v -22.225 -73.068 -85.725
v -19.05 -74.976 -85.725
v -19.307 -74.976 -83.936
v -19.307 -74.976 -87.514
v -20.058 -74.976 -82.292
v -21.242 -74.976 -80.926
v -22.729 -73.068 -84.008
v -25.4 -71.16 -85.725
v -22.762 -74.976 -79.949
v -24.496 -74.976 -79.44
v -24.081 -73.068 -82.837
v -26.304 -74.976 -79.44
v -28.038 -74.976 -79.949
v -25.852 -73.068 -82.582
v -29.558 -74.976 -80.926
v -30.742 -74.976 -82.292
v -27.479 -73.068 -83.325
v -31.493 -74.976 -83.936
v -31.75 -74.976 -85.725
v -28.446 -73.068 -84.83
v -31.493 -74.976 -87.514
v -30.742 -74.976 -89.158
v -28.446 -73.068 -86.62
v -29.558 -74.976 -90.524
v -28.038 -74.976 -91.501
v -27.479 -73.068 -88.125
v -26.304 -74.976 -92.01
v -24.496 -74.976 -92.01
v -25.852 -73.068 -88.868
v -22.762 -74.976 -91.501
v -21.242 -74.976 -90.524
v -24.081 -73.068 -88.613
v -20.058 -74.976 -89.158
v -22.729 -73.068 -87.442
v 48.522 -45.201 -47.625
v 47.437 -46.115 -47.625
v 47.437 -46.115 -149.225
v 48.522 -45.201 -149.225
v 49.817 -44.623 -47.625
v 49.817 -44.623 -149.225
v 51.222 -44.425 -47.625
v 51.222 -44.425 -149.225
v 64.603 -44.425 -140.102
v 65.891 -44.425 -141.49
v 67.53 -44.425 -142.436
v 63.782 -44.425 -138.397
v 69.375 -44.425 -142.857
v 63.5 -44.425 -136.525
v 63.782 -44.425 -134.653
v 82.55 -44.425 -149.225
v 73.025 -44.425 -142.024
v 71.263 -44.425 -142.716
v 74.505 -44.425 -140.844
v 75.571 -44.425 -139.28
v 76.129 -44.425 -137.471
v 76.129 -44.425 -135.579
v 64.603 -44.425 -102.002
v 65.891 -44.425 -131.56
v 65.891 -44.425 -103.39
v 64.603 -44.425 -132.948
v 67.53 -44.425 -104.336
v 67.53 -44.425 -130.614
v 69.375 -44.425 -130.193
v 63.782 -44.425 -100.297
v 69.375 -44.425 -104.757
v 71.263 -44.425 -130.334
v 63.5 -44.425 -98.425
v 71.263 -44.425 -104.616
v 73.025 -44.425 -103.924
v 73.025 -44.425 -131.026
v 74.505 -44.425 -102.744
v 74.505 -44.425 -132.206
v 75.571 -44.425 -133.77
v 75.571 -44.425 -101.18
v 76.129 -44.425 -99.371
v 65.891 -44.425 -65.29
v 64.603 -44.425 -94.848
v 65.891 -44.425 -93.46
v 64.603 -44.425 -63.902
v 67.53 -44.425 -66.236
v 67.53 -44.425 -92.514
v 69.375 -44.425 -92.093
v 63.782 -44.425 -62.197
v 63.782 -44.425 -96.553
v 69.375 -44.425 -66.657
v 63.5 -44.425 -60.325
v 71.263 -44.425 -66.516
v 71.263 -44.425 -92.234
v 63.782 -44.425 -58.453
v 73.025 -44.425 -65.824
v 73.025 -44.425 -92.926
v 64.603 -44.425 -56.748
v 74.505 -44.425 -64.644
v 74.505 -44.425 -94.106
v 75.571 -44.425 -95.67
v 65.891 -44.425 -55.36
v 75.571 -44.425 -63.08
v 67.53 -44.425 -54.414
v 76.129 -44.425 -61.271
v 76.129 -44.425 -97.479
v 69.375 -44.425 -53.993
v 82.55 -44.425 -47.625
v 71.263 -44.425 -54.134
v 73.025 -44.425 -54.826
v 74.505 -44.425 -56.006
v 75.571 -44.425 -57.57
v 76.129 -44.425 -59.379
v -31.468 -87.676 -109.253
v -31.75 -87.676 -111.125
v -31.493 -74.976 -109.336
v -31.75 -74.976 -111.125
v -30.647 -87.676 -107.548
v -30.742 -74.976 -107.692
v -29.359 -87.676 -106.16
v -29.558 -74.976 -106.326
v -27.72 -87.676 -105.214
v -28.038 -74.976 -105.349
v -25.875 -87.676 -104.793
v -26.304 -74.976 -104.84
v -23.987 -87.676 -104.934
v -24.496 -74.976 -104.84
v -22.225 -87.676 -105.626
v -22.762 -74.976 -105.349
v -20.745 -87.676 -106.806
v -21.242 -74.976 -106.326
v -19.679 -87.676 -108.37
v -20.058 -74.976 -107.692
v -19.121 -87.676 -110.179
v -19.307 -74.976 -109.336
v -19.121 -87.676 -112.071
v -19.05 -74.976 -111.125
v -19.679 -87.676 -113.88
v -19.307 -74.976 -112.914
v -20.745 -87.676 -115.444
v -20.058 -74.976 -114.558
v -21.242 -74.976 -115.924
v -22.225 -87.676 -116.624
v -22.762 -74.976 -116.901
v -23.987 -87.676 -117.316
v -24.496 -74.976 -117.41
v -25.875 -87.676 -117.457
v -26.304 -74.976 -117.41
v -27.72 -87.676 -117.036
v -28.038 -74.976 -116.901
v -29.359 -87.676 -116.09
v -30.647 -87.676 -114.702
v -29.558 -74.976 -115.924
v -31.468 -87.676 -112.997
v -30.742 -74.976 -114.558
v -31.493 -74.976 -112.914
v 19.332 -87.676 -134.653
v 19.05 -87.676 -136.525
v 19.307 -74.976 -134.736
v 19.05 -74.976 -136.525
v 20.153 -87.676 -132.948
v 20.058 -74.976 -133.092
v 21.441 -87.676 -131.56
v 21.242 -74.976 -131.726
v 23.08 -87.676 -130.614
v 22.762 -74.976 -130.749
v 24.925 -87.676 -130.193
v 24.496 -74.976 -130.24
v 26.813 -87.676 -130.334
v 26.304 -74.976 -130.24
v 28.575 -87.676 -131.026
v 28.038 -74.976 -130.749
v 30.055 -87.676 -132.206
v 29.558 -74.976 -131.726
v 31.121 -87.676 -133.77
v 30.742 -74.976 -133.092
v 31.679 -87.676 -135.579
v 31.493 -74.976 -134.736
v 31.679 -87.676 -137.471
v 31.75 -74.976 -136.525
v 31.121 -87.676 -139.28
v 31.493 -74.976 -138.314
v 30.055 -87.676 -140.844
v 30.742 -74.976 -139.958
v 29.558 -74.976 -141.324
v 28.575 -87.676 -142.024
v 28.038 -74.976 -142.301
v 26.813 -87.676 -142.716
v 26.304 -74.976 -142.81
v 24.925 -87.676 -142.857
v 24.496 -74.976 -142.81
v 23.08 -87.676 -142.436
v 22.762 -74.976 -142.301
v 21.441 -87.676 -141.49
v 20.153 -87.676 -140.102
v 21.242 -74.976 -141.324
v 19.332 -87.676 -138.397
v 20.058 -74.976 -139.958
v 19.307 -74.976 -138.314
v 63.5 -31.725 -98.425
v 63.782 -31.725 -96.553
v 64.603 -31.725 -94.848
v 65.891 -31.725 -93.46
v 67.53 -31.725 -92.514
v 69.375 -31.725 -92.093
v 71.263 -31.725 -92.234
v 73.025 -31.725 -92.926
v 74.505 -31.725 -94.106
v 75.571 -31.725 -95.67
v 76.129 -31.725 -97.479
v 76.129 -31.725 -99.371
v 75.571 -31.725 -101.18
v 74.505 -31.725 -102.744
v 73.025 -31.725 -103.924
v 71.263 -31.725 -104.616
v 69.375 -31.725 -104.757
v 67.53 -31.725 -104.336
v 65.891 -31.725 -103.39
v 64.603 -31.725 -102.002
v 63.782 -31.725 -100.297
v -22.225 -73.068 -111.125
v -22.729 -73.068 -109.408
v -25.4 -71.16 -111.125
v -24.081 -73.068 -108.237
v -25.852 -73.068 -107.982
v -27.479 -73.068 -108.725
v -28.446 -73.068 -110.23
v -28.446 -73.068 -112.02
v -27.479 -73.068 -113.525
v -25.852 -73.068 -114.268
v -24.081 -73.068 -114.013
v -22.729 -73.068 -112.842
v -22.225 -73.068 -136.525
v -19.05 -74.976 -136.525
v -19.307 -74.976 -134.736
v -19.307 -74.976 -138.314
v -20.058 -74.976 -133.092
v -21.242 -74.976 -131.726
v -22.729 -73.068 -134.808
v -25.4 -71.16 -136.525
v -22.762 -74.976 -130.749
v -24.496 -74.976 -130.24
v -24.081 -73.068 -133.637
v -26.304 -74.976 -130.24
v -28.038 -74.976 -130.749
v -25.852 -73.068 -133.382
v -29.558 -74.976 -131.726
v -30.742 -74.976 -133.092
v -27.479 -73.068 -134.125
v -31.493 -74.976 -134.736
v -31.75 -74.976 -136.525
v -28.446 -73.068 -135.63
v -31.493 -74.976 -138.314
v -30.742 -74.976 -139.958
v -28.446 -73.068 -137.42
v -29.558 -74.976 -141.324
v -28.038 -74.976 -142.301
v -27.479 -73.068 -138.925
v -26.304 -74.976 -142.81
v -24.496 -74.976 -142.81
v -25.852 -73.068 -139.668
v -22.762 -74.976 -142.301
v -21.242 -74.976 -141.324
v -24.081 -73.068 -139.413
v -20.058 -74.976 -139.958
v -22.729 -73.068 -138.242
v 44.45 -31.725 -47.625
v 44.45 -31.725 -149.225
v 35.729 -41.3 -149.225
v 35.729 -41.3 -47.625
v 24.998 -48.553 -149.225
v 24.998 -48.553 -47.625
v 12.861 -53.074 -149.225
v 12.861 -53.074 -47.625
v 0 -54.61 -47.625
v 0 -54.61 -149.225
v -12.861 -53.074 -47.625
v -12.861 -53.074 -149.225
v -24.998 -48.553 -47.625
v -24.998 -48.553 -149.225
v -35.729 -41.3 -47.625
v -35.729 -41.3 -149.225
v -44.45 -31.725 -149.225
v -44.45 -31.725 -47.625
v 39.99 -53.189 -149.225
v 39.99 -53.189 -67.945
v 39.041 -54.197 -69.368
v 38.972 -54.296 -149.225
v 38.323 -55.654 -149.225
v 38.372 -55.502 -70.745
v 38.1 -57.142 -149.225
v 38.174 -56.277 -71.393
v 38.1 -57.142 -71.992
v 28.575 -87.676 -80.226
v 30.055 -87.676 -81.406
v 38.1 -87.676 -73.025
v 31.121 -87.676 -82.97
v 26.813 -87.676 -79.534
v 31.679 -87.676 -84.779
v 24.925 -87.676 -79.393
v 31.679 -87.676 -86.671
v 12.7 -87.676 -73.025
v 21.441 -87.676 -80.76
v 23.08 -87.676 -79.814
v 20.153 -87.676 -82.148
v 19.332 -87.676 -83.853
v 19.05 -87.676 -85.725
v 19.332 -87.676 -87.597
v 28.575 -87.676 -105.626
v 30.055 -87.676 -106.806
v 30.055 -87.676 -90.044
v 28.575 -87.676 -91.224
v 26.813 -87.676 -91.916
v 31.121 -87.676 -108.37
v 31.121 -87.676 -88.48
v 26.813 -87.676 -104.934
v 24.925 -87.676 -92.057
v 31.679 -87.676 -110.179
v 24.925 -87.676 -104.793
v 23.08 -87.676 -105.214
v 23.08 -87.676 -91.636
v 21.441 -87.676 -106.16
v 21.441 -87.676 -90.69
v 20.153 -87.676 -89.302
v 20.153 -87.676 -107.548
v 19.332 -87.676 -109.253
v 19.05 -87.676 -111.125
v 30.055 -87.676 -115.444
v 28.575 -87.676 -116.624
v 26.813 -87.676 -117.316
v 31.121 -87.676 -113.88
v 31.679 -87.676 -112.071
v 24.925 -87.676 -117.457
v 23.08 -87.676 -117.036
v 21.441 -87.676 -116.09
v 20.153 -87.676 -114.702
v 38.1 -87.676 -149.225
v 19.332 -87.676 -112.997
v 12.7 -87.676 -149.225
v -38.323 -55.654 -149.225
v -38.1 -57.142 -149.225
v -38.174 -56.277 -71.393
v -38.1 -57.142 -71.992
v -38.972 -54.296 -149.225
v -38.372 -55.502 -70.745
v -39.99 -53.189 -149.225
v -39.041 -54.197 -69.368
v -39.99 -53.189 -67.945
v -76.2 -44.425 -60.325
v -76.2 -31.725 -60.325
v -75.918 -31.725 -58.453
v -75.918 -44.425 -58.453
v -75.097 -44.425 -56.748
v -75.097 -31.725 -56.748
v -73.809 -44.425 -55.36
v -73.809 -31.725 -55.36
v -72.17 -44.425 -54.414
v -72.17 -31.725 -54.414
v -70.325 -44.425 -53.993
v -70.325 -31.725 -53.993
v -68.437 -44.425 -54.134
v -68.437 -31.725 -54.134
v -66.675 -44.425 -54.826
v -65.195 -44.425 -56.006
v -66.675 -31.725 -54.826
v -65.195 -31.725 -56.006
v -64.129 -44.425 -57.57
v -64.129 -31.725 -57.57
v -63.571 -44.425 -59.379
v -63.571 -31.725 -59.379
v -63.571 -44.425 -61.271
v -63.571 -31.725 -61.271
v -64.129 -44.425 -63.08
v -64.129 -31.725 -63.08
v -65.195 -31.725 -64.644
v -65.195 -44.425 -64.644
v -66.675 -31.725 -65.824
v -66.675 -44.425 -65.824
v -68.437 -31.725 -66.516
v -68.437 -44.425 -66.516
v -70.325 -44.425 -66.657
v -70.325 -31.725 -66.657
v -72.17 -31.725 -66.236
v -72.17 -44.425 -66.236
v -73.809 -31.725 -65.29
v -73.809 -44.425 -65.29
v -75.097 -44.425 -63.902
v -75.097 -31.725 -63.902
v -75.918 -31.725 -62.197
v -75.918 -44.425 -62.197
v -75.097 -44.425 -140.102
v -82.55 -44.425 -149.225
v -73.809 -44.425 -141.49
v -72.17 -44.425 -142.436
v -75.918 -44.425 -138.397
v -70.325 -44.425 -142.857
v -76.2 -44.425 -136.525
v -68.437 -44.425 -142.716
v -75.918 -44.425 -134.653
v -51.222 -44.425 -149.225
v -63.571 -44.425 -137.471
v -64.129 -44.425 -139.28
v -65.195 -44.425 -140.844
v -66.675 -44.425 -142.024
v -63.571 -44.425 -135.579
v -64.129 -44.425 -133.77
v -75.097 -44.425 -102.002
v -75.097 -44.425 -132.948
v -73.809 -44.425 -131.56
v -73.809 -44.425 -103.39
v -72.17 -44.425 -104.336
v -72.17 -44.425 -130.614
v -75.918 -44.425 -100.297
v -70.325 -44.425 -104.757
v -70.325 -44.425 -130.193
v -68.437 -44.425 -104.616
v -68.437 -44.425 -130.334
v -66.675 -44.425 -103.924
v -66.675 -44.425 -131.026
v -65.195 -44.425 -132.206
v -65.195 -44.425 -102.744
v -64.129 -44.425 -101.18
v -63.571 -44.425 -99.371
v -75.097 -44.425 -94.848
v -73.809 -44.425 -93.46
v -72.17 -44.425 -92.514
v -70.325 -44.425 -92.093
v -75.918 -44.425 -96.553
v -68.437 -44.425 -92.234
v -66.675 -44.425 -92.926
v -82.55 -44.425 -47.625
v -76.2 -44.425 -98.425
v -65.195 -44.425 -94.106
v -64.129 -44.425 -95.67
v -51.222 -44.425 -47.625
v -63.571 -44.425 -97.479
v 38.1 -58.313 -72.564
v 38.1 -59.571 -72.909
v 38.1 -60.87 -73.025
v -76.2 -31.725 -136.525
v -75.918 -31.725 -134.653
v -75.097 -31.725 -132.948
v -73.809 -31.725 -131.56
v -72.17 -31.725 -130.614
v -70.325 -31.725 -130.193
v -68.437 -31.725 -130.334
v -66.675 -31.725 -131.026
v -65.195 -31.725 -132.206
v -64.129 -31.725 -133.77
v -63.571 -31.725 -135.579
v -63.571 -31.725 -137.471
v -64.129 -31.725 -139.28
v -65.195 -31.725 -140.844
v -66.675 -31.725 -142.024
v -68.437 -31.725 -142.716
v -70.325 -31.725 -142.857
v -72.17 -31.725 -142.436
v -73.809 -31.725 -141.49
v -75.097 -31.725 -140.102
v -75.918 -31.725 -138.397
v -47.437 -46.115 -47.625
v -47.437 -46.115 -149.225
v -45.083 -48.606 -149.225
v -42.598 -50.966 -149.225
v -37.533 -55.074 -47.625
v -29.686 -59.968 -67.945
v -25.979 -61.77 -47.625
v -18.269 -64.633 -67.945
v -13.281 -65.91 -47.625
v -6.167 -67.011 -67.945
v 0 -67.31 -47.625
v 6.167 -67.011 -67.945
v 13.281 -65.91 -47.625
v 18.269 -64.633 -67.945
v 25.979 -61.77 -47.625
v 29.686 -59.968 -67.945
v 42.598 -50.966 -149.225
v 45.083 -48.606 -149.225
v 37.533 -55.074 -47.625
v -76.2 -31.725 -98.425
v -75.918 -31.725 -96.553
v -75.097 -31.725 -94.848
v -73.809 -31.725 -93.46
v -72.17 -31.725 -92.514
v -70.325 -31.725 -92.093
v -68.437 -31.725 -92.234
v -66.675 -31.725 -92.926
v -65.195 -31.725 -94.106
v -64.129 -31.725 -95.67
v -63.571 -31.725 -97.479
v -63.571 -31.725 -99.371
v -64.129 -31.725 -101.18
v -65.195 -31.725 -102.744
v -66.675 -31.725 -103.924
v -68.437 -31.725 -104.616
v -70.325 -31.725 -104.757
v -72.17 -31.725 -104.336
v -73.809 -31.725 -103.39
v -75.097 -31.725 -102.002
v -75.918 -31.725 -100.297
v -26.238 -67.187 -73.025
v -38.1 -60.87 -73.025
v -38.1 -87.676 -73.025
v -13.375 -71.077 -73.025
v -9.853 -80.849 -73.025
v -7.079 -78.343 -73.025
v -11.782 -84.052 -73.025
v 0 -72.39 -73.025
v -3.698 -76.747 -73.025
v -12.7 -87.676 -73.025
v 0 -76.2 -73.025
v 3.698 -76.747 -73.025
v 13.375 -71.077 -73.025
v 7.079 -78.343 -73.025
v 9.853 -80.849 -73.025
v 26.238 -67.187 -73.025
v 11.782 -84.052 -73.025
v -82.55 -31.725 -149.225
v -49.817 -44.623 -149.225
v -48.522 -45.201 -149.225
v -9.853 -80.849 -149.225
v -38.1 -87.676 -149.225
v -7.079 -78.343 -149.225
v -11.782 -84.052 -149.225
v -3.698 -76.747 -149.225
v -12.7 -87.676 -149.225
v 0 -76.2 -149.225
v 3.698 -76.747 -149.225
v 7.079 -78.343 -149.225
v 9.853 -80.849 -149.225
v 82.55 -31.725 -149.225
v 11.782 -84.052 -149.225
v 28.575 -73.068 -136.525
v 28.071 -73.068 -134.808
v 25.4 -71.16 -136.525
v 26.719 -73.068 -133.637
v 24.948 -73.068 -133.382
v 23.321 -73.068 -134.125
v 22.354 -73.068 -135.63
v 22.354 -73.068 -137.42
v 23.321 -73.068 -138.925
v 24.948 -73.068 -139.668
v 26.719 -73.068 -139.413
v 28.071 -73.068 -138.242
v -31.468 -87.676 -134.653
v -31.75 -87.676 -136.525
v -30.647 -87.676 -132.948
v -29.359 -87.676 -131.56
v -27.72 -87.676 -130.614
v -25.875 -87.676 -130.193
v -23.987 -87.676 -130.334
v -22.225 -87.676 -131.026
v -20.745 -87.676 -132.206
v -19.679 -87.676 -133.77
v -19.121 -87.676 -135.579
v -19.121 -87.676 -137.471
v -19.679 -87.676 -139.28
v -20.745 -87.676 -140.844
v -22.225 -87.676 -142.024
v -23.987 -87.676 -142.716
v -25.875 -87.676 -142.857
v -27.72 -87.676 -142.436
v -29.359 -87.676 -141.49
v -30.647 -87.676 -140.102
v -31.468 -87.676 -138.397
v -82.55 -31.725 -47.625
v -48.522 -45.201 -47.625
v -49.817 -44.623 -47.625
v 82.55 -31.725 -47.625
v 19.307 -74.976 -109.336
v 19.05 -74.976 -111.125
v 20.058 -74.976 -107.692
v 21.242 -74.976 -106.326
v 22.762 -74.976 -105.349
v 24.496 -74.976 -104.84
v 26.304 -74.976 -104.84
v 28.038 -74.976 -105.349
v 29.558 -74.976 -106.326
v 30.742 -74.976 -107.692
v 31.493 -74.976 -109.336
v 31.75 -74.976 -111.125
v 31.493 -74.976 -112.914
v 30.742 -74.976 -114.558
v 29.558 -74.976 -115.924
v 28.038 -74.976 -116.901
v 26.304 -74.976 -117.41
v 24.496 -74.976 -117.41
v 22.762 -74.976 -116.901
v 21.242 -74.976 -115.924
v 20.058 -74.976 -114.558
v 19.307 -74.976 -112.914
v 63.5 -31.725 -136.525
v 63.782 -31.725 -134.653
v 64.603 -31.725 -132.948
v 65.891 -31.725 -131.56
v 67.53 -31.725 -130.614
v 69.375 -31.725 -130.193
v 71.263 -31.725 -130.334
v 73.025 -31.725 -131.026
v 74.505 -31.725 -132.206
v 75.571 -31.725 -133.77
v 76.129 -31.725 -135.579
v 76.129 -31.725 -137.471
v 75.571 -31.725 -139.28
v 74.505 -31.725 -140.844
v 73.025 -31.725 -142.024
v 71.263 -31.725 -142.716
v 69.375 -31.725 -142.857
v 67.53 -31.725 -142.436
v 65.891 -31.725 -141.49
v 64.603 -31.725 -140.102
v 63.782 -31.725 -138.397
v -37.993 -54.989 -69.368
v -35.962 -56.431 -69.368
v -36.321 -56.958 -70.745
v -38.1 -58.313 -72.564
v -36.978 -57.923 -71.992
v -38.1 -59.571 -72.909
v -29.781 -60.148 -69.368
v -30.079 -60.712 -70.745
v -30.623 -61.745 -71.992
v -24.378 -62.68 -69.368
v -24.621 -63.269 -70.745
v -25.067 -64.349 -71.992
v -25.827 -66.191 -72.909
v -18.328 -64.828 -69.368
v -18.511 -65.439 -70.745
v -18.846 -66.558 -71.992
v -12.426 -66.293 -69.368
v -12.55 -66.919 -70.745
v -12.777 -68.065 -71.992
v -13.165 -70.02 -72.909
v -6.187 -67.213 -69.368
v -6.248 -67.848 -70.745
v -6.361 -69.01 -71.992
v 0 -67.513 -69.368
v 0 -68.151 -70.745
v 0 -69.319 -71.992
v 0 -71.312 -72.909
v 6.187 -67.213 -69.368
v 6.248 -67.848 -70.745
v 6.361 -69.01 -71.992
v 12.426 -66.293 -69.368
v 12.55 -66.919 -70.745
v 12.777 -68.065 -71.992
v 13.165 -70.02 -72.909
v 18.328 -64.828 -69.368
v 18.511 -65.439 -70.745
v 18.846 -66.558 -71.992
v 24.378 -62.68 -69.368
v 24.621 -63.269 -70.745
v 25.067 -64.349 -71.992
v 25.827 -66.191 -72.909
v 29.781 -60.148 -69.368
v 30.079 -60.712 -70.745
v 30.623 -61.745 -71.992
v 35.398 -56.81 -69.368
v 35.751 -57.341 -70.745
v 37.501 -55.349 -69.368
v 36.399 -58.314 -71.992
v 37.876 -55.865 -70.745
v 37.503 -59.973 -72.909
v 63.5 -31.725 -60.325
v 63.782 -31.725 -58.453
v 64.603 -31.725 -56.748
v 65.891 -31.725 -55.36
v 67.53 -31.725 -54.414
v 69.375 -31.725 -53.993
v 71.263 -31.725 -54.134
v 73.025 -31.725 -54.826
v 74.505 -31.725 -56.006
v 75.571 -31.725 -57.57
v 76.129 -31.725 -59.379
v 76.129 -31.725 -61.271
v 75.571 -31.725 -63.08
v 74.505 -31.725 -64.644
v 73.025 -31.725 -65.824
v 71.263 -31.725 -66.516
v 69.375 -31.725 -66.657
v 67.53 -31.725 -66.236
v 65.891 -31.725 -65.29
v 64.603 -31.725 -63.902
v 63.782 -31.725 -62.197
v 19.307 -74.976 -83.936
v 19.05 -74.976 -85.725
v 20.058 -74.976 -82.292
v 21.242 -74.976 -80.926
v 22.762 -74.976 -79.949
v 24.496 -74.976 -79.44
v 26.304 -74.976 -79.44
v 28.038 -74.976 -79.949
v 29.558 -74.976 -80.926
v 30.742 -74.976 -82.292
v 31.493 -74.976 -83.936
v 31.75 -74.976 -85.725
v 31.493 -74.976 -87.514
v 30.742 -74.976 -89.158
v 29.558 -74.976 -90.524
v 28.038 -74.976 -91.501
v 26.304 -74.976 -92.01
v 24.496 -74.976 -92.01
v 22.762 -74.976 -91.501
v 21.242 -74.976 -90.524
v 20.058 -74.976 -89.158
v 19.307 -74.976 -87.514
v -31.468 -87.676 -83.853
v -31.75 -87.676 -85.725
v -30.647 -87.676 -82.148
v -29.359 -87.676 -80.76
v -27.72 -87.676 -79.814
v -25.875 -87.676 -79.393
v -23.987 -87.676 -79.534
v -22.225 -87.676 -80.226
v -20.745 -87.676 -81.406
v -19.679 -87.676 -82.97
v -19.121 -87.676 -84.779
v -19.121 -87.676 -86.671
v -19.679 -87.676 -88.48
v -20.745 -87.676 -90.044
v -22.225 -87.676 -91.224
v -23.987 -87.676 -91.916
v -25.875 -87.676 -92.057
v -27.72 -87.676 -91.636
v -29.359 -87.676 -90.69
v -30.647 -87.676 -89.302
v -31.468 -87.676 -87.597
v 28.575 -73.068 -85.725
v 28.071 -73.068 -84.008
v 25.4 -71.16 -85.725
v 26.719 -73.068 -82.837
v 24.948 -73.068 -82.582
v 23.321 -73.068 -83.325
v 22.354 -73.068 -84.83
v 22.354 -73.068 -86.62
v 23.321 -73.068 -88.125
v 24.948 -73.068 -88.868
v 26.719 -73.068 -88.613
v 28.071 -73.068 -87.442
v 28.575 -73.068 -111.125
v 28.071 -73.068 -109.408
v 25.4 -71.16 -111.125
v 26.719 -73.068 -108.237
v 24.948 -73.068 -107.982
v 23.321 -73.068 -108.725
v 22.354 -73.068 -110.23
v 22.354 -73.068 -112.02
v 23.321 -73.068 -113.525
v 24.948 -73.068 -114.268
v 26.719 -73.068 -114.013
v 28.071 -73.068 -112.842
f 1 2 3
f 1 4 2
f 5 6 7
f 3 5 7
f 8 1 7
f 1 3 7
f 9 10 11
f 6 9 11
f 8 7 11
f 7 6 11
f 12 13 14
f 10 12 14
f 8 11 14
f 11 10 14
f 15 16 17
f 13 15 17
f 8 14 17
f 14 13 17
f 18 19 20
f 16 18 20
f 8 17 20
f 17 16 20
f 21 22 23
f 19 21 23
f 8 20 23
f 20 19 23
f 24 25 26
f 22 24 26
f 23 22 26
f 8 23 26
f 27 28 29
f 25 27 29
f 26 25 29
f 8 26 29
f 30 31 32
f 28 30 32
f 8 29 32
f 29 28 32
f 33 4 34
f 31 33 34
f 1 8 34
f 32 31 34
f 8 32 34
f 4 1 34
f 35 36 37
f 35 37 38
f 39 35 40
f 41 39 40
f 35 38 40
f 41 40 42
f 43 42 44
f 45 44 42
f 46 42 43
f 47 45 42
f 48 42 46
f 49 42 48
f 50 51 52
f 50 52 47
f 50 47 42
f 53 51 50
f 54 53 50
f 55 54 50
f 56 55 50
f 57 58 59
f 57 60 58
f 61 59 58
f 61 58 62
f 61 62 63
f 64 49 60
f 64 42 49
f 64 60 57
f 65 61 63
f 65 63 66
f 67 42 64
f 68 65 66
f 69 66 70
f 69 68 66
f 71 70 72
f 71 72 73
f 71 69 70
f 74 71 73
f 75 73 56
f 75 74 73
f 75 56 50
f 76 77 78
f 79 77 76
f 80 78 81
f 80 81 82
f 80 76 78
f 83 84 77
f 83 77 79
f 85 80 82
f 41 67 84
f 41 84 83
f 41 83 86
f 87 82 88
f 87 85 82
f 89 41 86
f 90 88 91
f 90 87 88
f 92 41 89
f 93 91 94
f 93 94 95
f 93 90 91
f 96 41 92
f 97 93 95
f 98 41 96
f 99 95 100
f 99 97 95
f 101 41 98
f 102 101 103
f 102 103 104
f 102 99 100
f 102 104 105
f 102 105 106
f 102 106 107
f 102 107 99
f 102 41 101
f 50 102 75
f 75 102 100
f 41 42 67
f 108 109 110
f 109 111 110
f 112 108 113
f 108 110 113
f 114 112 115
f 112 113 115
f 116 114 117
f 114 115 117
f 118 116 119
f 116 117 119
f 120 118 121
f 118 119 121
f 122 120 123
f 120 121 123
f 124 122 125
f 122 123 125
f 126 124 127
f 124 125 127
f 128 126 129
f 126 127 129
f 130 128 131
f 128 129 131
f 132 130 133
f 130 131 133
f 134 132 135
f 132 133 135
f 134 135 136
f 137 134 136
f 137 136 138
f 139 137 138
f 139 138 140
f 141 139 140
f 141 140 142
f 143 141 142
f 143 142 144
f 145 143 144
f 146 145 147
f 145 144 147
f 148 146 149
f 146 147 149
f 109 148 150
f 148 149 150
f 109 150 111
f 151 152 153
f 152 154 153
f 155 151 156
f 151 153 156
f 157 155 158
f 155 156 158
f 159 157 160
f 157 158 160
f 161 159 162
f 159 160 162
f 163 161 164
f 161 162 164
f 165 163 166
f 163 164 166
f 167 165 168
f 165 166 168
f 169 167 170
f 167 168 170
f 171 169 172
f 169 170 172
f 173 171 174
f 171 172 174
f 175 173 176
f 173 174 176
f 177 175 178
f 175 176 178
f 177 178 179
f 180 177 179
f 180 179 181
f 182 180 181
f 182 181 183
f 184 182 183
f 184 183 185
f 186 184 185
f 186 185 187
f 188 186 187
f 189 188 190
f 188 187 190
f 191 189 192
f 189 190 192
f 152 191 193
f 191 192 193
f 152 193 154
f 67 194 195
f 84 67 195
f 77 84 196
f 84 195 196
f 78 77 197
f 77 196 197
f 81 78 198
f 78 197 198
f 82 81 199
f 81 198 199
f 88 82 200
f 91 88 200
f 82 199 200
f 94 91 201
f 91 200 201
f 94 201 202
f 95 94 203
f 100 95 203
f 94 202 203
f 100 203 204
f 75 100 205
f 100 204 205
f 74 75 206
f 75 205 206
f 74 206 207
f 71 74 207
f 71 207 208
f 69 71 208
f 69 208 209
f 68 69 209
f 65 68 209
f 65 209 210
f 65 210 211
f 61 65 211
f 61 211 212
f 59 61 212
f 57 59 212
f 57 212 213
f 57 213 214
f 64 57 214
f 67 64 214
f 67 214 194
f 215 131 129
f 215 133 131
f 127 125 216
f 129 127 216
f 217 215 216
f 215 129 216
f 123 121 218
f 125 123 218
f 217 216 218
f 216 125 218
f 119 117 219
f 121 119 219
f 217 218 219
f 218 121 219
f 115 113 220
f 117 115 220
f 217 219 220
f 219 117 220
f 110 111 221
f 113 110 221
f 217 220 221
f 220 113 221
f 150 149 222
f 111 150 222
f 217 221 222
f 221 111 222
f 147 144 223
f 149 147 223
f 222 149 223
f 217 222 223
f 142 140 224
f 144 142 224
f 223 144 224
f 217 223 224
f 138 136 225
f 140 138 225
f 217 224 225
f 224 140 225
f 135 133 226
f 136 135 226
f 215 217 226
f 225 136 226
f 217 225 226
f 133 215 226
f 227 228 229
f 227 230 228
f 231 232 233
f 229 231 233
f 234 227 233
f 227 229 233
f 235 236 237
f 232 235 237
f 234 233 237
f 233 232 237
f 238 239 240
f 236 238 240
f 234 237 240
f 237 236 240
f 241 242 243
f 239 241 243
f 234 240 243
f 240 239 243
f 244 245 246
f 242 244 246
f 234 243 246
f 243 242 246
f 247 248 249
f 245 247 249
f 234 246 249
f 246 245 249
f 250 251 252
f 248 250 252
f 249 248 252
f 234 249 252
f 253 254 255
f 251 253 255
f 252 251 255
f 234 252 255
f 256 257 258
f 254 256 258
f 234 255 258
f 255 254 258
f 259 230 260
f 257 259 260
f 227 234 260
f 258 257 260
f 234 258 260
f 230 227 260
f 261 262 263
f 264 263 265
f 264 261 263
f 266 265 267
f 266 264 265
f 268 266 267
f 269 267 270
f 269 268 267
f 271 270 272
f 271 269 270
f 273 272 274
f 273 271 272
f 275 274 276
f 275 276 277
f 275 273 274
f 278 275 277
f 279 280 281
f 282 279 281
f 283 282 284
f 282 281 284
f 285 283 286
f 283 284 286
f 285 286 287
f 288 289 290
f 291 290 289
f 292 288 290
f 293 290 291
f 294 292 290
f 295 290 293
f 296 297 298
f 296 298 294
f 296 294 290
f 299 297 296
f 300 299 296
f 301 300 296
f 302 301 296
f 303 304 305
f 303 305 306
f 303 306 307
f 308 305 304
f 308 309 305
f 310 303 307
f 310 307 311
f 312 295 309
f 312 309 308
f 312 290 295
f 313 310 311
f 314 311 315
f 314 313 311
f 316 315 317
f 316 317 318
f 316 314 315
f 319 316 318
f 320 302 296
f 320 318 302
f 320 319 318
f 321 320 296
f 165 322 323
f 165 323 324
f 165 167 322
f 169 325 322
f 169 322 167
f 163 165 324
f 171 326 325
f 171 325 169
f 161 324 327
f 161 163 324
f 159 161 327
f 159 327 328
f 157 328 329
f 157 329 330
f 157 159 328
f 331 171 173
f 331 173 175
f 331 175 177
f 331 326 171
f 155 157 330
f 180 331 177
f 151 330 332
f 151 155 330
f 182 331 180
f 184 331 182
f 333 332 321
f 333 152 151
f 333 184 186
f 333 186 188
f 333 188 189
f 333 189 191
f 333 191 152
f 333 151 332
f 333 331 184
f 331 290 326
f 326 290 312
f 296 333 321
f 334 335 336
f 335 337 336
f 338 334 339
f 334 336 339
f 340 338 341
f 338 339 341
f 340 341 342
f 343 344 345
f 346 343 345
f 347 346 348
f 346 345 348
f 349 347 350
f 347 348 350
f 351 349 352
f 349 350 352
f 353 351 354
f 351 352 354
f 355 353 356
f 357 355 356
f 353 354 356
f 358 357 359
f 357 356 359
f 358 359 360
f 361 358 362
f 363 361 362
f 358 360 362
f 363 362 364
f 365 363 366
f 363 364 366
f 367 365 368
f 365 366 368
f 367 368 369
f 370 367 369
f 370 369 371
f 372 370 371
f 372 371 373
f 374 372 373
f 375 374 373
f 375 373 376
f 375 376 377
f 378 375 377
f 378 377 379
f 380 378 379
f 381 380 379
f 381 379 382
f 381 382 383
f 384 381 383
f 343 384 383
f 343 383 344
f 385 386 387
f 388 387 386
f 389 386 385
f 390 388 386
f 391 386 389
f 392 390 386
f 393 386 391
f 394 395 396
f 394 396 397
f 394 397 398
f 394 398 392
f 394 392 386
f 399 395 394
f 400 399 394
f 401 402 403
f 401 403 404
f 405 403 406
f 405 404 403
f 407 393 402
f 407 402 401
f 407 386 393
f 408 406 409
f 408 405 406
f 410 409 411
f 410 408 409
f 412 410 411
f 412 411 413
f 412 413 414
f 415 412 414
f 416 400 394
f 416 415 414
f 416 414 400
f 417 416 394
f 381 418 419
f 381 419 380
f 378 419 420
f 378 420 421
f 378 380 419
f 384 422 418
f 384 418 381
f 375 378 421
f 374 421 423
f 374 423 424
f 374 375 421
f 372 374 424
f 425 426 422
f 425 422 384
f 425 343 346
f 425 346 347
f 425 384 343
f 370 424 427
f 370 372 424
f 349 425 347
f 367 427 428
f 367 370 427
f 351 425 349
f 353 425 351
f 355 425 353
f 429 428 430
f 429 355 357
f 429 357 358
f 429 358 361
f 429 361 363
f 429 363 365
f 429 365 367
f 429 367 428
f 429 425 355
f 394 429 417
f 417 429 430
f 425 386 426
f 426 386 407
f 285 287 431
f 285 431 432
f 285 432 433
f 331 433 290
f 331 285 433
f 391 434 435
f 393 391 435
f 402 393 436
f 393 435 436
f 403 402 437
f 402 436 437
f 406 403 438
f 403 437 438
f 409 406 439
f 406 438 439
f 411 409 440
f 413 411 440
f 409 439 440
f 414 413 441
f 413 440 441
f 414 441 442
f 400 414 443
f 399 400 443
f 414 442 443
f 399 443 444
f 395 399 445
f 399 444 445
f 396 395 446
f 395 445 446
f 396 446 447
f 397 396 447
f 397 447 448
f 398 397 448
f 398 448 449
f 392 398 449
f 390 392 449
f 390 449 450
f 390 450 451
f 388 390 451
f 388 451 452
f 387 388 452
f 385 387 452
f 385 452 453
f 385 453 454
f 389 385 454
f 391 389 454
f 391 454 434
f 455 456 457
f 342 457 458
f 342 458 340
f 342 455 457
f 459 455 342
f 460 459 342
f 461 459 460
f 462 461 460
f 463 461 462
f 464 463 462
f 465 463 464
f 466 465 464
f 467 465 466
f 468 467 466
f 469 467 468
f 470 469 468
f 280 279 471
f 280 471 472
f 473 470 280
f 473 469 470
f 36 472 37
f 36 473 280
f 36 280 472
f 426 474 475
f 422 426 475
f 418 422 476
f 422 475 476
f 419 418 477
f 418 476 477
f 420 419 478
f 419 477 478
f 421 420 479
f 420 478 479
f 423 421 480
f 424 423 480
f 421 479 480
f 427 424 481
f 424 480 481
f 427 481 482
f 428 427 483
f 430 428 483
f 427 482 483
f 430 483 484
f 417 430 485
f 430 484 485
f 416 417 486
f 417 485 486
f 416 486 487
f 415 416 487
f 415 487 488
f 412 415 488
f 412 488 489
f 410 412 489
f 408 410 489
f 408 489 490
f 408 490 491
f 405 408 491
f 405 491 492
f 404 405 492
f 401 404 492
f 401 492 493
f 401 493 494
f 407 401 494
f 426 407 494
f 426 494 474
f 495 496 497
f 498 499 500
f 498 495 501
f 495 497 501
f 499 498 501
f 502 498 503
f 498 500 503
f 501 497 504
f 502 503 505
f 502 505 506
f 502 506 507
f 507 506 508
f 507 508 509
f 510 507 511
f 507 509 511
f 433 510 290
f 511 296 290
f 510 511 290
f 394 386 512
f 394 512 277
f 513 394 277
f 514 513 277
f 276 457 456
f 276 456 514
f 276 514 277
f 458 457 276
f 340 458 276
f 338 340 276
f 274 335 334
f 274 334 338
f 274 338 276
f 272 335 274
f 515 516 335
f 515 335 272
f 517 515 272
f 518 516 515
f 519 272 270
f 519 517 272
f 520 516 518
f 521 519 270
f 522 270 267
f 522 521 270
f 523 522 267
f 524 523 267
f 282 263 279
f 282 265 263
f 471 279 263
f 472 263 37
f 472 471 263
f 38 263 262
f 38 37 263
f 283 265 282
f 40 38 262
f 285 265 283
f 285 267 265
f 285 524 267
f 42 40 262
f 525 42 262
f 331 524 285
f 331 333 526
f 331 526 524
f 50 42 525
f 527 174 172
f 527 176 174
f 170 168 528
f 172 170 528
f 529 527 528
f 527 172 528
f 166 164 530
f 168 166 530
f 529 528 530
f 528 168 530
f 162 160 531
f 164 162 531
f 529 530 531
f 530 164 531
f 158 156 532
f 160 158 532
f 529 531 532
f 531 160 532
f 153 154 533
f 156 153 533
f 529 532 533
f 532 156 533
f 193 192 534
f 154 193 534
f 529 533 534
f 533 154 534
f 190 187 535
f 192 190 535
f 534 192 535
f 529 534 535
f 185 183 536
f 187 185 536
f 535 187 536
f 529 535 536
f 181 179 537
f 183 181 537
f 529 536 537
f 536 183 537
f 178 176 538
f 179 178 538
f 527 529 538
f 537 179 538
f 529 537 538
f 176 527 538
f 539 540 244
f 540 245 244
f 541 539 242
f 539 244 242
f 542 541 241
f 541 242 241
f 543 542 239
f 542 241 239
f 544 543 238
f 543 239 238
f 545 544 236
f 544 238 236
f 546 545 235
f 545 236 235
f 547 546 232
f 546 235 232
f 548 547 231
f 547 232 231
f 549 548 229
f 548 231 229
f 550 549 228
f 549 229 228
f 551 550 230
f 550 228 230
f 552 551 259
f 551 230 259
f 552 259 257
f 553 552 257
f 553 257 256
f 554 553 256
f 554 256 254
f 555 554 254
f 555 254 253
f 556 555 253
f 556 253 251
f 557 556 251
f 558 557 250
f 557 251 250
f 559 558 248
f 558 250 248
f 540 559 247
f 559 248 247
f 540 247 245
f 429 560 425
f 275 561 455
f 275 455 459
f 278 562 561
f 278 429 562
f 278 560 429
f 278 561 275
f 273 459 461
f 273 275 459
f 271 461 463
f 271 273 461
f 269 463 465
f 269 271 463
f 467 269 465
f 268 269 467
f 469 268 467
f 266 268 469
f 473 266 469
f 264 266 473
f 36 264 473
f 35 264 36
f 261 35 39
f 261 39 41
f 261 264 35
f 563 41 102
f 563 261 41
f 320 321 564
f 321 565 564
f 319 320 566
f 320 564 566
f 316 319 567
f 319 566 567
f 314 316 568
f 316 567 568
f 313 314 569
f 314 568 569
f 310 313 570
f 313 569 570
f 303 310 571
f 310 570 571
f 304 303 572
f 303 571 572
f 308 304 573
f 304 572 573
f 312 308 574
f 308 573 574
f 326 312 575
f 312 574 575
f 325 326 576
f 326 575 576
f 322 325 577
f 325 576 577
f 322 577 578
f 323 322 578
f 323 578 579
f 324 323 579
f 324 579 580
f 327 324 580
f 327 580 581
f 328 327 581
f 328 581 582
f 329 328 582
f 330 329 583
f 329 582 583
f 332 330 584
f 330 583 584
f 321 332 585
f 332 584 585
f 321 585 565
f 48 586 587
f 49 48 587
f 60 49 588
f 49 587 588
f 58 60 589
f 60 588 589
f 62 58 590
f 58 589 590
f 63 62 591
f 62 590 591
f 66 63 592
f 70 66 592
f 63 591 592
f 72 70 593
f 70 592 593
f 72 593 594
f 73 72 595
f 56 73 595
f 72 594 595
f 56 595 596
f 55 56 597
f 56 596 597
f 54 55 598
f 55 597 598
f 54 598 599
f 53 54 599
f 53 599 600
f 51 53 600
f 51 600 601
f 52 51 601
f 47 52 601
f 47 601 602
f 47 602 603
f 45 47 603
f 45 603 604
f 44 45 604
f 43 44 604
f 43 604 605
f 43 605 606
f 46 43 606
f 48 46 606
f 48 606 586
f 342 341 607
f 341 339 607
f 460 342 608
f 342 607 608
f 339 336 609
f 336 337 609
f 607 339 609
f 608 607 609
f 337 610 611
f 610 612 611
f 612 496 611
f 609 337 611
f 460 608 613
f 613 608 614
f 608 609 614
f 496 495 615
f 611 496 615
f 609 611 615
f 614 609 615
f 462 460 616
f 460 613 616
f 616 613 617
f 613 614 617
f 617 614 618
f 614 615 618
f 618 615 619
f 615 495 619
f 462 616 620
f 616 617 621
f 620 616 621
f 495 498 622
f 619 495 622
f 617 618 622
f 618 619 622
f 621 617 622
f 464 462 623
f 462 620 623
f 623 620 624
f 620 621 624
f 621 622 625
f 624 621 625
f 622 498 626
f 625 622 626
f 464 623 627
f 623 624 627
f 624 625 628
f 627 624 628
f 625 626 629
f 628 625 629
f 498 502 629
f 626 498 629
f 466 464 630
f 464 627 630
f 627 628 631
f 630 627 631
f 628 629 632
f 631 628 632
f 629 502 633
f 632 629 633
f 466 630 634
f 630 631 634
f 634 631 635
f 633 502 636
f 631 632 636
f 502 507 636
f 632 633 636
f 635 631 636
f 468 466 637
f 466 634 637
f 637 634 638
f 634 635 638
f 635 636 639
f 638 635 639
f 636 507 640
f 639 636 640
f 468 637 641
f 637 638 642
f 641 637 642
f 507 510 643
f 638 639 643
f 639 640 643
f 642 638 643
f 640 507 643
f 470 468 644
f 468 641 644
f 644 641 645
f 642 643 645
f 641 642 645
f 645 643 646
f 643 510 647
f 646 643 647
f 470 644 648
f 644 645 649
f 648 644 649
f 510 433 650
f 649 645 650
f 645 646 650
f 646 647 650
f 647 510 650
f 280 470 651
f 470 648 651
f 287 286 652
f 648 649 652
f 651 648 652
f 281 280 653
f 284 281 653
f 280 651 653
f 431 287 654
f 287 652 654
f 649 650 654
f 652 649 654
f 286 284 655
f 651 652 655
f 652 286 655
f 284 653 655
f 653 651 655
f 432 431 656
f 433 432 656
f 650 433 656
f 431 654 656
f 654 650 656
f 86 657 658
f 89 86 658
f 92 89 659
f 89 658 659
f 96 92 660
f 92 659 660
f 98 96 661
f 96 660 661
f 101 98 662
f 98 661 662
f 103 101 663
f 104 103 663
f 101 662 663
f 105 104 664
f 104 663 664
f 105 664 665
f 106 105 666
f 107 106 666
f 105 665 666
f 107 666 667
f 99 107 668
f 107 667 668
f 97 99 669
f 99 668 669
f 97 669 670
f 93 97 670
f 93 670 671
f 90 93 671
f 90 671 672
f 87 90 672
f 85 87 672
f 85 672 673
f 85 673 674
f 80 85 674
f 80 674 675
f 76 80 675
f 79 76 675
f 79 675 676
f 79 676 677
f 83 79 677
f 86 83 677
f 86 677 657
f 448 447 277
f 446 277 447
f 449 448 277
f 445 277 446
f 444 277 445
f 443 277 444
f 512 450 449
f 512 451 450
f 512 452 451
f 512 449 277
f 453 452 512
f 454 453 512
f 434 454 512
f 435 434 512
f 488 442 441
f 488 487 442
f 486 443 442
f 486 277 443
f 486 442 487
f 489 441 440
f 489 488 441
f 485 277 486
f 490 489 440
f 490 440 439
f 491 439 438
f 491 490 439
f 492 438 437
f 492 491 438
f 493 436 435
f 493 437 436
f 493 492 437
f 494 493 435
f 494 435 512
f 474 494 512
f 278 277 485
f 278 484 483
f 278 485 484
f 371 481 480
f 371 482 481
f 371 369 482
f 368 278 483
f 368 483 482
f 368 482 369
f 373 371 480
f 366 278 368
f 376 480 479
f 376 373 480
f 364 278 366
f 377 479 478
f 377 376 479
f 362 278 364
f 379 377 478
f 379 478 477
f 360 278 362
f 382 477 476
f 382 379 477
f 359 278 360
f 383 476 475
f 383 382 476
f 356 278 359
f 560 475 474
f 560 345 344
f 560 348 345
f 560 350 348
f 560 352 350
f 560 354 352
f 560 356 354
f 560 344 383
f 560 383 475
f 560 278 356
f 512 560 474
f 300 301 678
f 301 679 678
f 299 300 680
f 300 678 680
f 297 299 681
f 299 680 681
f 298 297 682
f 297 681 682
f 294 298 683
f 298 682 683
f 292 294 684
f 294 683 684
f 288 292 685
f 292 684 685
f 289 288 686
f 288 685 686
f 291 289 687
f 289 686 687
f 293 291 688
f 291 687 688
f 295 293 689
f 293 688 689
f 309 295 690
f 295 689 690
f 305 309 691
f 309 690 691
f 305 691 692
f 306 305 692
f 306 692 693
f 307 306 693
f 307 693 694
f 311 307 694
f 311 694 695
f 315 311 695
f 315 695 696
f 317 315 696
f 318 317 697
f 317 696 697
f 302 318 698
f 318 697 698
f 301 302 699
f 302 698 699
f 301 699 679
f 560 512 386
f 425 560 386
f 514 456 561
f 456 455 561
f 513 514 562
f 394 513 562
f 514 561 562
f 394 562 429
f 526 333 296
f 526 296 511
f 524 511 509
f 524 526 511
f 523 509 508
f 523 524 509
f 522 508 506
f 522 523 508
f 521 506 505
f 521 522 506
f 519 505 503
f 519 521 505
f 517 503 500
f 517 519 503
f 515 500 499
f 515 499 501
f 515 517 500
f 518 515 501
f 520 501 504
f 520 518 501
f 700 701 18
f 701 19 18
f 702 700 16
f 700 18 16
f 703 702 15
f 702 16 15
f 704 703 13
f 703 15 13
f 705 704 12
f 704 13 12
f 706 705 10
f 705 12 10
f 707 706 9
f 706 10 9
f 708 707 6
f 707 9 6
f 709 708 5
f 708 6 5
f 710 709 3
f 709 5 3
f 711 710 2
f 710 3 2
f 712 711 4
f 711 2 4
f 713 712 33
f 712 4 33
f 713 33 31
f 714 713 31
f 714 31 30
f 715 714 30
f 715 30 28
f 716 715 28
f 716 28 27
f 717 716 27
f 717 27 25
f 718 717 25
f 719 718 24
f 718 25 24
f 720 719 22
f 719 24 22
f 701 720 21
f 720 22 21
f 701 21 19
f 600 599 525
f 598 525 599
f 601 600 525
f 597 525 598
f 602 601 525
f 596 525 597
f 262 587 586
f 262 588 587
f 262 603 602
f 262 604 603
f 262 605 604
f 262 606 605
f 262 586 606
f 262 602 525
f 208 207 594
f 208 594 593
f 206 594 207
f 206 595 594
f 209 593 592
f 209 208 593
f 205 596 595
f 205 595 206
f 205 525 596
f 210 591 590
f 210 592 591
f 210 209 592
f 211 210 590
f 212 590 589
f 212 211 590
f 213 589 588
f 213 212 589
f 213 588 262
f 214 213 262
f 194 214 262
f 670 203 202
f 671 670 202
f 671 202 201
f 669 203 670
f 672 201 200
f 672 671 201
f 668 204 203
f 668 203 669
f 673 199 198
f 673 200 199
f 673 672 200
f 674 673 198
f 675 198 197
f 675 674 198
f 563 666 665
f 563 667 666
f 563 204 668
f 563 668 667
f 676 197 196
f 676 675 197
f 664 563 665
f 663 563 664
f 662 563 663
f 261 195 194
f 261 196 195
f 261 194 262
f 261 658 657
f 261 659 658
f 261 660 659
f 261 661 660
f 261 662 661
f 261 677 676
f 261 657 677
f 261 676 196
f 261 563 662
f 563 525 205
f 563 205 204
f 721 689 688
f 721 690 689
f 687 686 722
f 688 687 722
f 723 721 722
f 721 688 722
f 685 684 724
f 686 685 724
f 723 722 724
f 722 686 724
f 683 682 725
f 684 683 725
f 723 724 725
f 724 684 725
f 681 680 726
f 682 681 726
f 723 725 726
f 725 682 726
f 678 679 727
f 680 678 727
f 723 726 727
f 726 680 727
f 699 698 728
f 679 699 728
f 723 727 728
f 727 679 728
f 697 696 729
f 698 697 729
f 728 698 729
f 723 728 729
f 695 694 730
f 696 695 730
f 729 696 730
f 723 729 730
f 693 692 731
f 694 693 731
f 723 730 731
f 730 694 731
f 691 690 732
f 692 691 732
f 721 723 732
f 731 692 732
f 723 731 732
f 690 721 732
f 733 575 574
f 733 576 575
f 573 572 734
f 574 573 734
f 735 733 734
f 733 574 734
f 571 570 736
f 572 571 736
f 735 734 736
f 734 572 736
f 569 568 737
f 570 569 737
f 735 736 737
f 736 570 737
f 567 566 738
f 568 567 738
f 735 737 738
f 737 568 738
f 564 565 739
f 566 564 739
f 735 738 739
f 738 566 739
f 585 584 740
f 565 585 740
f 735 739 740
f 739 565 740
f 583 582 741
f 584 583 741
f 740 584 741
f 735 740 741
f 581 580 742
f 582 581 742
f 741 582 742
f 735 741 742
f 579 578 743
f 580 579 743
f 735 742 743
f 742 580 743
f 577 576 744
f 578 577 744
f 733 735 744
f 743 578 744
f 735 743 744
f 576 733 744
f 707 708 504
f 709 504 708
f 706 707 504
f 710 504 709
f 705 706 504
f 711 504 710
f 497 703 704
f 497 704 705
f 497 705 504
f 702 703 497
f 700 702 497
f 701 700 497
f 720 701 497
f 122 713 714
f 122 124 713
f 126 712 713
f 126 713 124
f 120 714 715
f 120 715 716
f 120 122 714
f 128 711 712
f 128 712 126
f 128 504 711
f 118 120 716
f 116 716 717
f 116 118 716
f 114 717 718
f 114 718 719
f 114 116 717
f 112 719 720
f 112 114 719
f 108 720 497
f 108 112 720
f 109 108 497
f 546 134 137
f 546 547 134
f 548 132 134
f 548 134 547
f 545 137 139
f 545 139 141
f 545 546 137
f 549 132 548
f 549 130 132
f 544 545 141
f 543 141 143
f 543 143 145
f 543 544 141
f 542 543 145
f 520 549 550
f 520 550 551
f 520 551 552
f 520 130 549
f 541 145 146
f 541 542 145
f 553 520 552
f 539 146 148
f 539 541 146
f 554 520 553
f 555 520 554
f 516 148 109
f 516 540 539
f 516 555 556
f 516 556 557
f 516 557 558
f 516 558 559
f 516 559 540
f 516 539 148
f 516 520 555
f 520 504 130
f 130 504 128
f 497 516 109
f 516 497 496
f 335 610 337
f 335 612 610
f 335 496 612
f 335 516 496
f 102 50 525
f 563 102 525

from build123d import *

# Parameters (mm, degrees)
F0_R      = 6.35
F1_DEPTH  = 47.625
F3_DEPTH  = 31.75
F4_R      = 23.8125
F4_R_2    = 18.7325
F5_DEPTH  = 20.32
F6_R      = 54.61
F6_R_2    = 6.35
F7_DEPTH  = 14.605
F8_R      = 54.5973
F8_R_2    = 6.35
F9_DEPTH  = 118.491
F10_R     = 54.61
F10_R_2   = 54.5973
F10_R_3   = 6.35
F11_DEPTH = 57.15
F13_DEPTH = 101.6
F15_DEPTH = 25.4
F16_DEPTH = 76.2
F18_DEPTH = 76.2
F20_D     = 12.7
F20_DEPTH = 12.7
F20_TIP   = 3.8154649308
F22_D     = 12.7
F22_2_D   = 12.7
F23_R     = 5.08
F23_2_R   = 5.08


with BuildPart() as f1:
    # F0 (on Top) → F1 (new body)
    with BuildSketch(Plane.XY):
        Circle(F0_R)
    extrude(amount=-F1_DEPTH)

    # F2 (on face) → F3 (cut)
    with BuildSketch(Plane.XY):
        with BuildLine():
            Line((-3.4925, 5.3032955556), (3.4925, 5.3032955556))
            ThreePointArc((3.4925, 5.3032955556), (0, 6.35), (-3.4925, 5.3032955556))
        make_face()
    extrude(amount=-F3_DEPTH, mode=Mode.SUBTRACT)


with BuildPart() as f5:
    # F4 (on face) → F5 (new body)
    with BuildSketch(Plane(origin=(0, 0, -47.625), x_dir=(1, 0, 0), z_dir=(0, 0, -1))):
        Circle(F4_R)
        Circle(F4_R_2, mode=Mode.SUBTRACT)
    extrude(amount=-F5_DEPTH)


with BuildPart() as f7:
    # F6 (on face) → F7 (new body)
    with BuildSketch(Plane(origin=(0, 0, -47.625), x_dir=(1, 0, 0), z_dir=(0, 0, -1))):
        Circle(F6_R)
        Circle(F6_R_2, mode=Mode.SUBTRACT)
    extrude(amount=F7_DEPTH)

    # F8 (on face) → F9 (join)
    with BuildSketch(Plane(origin=(0, 0, -62.23), x_dir=(1, 0, 0), z_dir=(0, 0, -1))):
        Circle(F8_R)
        Circle(F8_R_2, mode=Mode.SUBTRACT)
    extrude(amount=F9_DEPTH)

    # F10 (on face) → F11 (join)
    with BuildSketch(Plane(origin=(0, 0, -180.721), x_dir=(1, 0, 0), z_dir=(0, 0, -1))):
        Circle(F10_R)
        Circle(F10_R_2, mode=Mode.SUBTRACT)
        Circle(F10_R_2)
        Circle(F10_R_3, mode=Mode.SUBTRACT)
    extrude(amount=F11_DEPTH)


with BuildPart() as f13:
    # F12 (on face) → F13 (new body)
    with BuildSketch(Plane.XY.offset(-47.625)):
        with BuildLine():
            Line((-82.55, 31.7245898319), (-44.45, 31.7245898319))
            ThreePointArc((-44.45, 31.7245898319), (-24.9977223891, 48.5527133676), (0, 54.61))
            Line((0, 54.61), (0, 67.31))
            ThreePointArc((0, 67.31), (-26.9947671741, 61.30558596), (-48.8991597124, 44.4245898319))
            Line((-48.8991597124, 44.4245898319), (-82.55, 44.4245898319))
            Line((-82.55, 44.4245898319), (-82.55, 31.7245898319))
        make_face()
        with BuildLine():
            ThreePointArc((0, 54.61), (24.9977223891, 48.5527133676), (44.45, 31.7245898319))
            Line((44.45, 31.7245898319), (82.55, 31.7245898319))
            Line((82.55, 31.7245898319), (82.55, 44.4245898319))
            Line((82.55, 44.4245898319), (48.8991597124, 44.4245898319))
            ThreePointArc((48.8991597124, 44.4245898319), (26.9947671741, 61.30558596), (0, 67.31))
            Line((0, 67.31), (0, 54.61))
        make_face()
    extrude(amount=-F13_DEPTH)

    # F22 (through all)
    with Locations(Plane.XZ.offset(44.4245898319)):
        with Locations((-69.85, -60.325), (-69.85, -98.425), (-69.85, -136.525), (69.85, -60.325), (69.85, -98.425), (69.85, -136.525)):
            Hole(F22_D / 2)

    # F23#2
    f23_2_edges = [f13.edges().sort_by_distance(p)[0] for p in [
        (-48.89916, 44.42459, -98.425),
        (48.89916, 44.42459, -98.425),
    ]]
    fillet(f23_2_edges, radius=F23_2_R)


with BuildPart() as f15:
    # F14 (on face) → F15 (new body)
    with BuildSketch(Plane.XY.offset(-47.625)):
        with BuildLine():
            Line((82.55, -31.7245898319), (44.45, -31.7245898319))
            ThreePointArc((44.45, -31.7245898319), (24.9977223891, -48.5527133676), (0, -54.61))
            Line((0, -54.61), (0, -67.31))
            ThreePointArc((0, -67.31), (26.9947671741, -61.30558596), (48.8991597124, -44.4245898319))
            Line((48.8991597124, -44.4245898319), (82.55, -44.4245898319))
            Line((82.55, -44.4245898319), (82.55, -31.7245898319))
        make_face()
        with BuildLine():
            ThreePointArc((0, -54.61), (-24.9977223891, -48.5527133676), (-44.45, -31.7245898319))
            Line((-44.45, -31.7245898319), (-82.55, -31.7245898319))
            Line((-82.55, -31.7245898319), (-82.55, -44.4245898319))
            Line((-82.55, -44.4245898319), (-48.8991597124, -44.4245898319))
            ThreePointArc((-48.8991597124, -44.4245898319), (-26.9947671741, -61.30558596), (0, -67.31))
            Line((0, -67.31), (0, -54.61))
        make_face()
    extrude(amount=-F15_DEPTH)

    # F16 (add): faces of the model
    f16_faces = [f15.faces().sort_by_distance(p)[0] for p in [
        (80.8610852178, -38.0745898319, -73.025),
        (80.8610852178, -38.0745898319, -73.025),
    ]]
    extrude(f16_faces, amount=F16_DEPTH)

    # F17 (on face) → F18 (join)
    with BuildSketch(Plane(origin=(0, 0, -149.225), x_dir=(1, 0, 0), z_dir=(0, 0, -1))):
        with BuildLine():
            Line((-38.1, 87.6758182624), (-38.1, 54.6558182624))
            ThreePointArc((-38.1, 54.6558182624), (0, 67.31), (38.1, 54.6558182624))
            Line((38.1, 54.6558182624), (38.1, 87.6758182624))
            Line((38.1, 87.6758182624), (12.7, 87.6758182624))
            ThreePointArc((12.7, 87.6758182624), (0, 76.2), (-12.7, 87.6758182624))
            Line((-12.7, 87.6758182624), (-38.1, 87.6758182624))
        make_face()
    extrude(amount=-F18_DEPTH)

    # F20
    with Locations(Plane.XZ.offset(87.6758182624)):
        with Locations((-25.4, -85.725), (25.4, -85.725), (-25.4, -111.125), (25.4, -111.125), (-25.4, -136.525), (25.4, -136.525)):
            Hole(F20_D / 2, depth=F20_DEPTH)
            with Locations((0, 0, -(F20_DEPTH + F20_TIP / 2))):  # 118° drill point
                Cone(0, F20_D / 2, F20_TIP, mode=Mode.SUBTRACT)

    # F22#2 (through all)
    with Locations(Plane.XZ.offset(44.4245898319)):
        with Locations((-69.85, -60.325), (-69.85, -98.425), (-69.85, -136.525), (69.85, -60.325), (69.85, -98.425), (69.85, -136.525)):
            Hole(F22_2_D / 2)

    # F23
    f23_edges = [f15.edges().sort_by_distance(p)[0] for p in [
        (-38.1, -54.655818, -111.125),
        (0, -67.31, -73.025),
        (38.1, -54.655818, -111.125),
        (48.89916, -44.42459, -98.425),
        (-48.89916, -44.42459, -98.425),
    ]]
    fillet(f23_edges, radius=F23_R)


solid = f15.part
